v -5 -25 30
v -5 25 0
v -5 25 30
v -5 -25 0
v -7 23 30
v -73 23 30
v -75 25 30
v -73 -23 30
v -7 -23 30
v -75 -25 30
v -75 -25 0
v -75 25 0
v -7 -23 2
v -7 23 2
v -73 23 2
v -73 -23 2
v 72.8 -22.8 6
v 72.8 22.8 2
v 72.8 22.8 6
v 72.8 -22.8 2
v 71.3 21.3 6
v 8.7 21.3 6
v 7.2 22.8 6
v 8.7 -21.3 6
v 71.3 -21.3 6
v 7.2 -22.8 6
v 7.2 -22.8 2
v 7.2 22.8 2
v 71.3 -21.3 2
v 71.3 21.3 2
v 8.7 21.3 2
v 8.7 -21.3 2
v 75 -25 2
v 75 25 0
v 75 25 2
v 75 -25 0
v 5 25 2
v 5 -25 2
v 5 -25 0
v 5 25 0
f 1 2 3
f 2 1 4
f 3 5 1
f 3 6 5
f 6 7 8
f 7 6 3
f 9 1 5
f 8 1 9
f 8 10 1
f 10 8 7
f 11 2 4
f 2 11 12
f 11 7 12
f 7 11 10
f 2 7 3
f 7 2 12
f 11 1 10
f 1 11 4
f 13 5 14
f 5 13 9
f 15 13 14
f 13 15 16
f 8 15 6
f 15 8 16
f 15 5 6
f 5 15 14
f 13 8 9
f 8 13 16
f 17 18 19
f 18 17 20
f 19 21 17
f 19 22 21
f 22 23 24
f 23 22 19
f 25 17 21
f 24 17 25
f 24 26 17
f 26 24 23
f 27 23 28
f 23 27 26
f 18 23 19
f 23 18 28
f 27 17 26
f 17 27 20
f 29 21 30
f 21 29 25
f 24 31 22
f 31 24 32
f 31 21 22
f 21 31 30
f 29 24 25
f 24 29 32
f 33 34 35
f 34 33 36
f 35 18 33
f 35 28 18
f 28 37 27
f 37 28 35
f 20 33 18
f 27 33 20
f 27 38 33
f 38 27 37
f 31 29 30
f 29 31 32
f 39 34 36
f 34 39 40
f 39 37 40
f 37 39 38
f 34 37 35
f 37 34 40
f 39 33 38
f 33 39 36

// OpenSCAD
// Two-part enclosure: open-top box + upside-down lid, printed side by side
// Units: mm

$fn = 64;

// ---------- Box ----------
box_x     = 70;    // box outer length (X)
box_y     = 50;    // box outer width (Y)
box_z     = 30;    // box outer height (Z)
wall      = 2;     // box wall thickness
floor_t   = 2;     // box floor thickness

// ---------- Lid ----------
lid_x     = 70;    // lid plate length (X)
lid_y     = 50;    // lid plate width (Y)
lid_t     = 2;     // lid plate thickness
lip_x     = 65.6;  // lip outer length (X)
lip_y     = 45.6;  // lip outer width (Y)
lip_wall  = 1.5;   // lip wall thickness
lip_h     = 4;     // lip height above plate

// ---------- Layout ----------
gap       = 10;    // gap between parts on the bed
eps       = 0.5;   // cutter overshoot past faces

// Centre the pair of parts on the origin in X
total_x   = box_x + gap + lid_x;
box_cx    = -total_x/2 + box_x/2;          // box centre X
lid_cx    =  total_x/2 - lid_x/2;          // lid centre X (+X side)

// ---------- Part 1: box ----------
module box() {
    difference() {
        translate([-box_x/2, -box_y/2, 0])
            cube([box_x, box_y, box_z]);
        // inner cavity, open top
        translate([-(box_x - 2*wall)/2, -(box_y - 2*wall)/2, floor_t])
            cube([box_x - 2*wall, box_y - 2*wall, box_z - floor_t + eps]);
    }
}

// ---------- Part 2: lid (printed upside down) ----------
module lid() {
    union() {
        // plate on the bed
        translate([-lid_x/2, -lid_y/2, 0])
            cube([lid_x, lid_y, lid_t]);
        // rectangular lip on top of plate
        difference() {
            translate([-lip_x/2, -lip_y/2, lid_t - 0.01])
                cube([lip_x, lip_y, lip_h + 0.01]);
            translate([-(lip_x - 2*lip_wall)/2, -(lip_y - 2*lip_wall)/2, lid_t - eps])
                cube([lip_x - 2*lip_wall, lip_y - 2*lip_wall, lip_h + 2*eps]);
        }
    }
}

// ---------- Assembly on the bed ----------
translate([box_cx, 0, 0]) box();
translate([lid_cx, 0, 0]) lid();
